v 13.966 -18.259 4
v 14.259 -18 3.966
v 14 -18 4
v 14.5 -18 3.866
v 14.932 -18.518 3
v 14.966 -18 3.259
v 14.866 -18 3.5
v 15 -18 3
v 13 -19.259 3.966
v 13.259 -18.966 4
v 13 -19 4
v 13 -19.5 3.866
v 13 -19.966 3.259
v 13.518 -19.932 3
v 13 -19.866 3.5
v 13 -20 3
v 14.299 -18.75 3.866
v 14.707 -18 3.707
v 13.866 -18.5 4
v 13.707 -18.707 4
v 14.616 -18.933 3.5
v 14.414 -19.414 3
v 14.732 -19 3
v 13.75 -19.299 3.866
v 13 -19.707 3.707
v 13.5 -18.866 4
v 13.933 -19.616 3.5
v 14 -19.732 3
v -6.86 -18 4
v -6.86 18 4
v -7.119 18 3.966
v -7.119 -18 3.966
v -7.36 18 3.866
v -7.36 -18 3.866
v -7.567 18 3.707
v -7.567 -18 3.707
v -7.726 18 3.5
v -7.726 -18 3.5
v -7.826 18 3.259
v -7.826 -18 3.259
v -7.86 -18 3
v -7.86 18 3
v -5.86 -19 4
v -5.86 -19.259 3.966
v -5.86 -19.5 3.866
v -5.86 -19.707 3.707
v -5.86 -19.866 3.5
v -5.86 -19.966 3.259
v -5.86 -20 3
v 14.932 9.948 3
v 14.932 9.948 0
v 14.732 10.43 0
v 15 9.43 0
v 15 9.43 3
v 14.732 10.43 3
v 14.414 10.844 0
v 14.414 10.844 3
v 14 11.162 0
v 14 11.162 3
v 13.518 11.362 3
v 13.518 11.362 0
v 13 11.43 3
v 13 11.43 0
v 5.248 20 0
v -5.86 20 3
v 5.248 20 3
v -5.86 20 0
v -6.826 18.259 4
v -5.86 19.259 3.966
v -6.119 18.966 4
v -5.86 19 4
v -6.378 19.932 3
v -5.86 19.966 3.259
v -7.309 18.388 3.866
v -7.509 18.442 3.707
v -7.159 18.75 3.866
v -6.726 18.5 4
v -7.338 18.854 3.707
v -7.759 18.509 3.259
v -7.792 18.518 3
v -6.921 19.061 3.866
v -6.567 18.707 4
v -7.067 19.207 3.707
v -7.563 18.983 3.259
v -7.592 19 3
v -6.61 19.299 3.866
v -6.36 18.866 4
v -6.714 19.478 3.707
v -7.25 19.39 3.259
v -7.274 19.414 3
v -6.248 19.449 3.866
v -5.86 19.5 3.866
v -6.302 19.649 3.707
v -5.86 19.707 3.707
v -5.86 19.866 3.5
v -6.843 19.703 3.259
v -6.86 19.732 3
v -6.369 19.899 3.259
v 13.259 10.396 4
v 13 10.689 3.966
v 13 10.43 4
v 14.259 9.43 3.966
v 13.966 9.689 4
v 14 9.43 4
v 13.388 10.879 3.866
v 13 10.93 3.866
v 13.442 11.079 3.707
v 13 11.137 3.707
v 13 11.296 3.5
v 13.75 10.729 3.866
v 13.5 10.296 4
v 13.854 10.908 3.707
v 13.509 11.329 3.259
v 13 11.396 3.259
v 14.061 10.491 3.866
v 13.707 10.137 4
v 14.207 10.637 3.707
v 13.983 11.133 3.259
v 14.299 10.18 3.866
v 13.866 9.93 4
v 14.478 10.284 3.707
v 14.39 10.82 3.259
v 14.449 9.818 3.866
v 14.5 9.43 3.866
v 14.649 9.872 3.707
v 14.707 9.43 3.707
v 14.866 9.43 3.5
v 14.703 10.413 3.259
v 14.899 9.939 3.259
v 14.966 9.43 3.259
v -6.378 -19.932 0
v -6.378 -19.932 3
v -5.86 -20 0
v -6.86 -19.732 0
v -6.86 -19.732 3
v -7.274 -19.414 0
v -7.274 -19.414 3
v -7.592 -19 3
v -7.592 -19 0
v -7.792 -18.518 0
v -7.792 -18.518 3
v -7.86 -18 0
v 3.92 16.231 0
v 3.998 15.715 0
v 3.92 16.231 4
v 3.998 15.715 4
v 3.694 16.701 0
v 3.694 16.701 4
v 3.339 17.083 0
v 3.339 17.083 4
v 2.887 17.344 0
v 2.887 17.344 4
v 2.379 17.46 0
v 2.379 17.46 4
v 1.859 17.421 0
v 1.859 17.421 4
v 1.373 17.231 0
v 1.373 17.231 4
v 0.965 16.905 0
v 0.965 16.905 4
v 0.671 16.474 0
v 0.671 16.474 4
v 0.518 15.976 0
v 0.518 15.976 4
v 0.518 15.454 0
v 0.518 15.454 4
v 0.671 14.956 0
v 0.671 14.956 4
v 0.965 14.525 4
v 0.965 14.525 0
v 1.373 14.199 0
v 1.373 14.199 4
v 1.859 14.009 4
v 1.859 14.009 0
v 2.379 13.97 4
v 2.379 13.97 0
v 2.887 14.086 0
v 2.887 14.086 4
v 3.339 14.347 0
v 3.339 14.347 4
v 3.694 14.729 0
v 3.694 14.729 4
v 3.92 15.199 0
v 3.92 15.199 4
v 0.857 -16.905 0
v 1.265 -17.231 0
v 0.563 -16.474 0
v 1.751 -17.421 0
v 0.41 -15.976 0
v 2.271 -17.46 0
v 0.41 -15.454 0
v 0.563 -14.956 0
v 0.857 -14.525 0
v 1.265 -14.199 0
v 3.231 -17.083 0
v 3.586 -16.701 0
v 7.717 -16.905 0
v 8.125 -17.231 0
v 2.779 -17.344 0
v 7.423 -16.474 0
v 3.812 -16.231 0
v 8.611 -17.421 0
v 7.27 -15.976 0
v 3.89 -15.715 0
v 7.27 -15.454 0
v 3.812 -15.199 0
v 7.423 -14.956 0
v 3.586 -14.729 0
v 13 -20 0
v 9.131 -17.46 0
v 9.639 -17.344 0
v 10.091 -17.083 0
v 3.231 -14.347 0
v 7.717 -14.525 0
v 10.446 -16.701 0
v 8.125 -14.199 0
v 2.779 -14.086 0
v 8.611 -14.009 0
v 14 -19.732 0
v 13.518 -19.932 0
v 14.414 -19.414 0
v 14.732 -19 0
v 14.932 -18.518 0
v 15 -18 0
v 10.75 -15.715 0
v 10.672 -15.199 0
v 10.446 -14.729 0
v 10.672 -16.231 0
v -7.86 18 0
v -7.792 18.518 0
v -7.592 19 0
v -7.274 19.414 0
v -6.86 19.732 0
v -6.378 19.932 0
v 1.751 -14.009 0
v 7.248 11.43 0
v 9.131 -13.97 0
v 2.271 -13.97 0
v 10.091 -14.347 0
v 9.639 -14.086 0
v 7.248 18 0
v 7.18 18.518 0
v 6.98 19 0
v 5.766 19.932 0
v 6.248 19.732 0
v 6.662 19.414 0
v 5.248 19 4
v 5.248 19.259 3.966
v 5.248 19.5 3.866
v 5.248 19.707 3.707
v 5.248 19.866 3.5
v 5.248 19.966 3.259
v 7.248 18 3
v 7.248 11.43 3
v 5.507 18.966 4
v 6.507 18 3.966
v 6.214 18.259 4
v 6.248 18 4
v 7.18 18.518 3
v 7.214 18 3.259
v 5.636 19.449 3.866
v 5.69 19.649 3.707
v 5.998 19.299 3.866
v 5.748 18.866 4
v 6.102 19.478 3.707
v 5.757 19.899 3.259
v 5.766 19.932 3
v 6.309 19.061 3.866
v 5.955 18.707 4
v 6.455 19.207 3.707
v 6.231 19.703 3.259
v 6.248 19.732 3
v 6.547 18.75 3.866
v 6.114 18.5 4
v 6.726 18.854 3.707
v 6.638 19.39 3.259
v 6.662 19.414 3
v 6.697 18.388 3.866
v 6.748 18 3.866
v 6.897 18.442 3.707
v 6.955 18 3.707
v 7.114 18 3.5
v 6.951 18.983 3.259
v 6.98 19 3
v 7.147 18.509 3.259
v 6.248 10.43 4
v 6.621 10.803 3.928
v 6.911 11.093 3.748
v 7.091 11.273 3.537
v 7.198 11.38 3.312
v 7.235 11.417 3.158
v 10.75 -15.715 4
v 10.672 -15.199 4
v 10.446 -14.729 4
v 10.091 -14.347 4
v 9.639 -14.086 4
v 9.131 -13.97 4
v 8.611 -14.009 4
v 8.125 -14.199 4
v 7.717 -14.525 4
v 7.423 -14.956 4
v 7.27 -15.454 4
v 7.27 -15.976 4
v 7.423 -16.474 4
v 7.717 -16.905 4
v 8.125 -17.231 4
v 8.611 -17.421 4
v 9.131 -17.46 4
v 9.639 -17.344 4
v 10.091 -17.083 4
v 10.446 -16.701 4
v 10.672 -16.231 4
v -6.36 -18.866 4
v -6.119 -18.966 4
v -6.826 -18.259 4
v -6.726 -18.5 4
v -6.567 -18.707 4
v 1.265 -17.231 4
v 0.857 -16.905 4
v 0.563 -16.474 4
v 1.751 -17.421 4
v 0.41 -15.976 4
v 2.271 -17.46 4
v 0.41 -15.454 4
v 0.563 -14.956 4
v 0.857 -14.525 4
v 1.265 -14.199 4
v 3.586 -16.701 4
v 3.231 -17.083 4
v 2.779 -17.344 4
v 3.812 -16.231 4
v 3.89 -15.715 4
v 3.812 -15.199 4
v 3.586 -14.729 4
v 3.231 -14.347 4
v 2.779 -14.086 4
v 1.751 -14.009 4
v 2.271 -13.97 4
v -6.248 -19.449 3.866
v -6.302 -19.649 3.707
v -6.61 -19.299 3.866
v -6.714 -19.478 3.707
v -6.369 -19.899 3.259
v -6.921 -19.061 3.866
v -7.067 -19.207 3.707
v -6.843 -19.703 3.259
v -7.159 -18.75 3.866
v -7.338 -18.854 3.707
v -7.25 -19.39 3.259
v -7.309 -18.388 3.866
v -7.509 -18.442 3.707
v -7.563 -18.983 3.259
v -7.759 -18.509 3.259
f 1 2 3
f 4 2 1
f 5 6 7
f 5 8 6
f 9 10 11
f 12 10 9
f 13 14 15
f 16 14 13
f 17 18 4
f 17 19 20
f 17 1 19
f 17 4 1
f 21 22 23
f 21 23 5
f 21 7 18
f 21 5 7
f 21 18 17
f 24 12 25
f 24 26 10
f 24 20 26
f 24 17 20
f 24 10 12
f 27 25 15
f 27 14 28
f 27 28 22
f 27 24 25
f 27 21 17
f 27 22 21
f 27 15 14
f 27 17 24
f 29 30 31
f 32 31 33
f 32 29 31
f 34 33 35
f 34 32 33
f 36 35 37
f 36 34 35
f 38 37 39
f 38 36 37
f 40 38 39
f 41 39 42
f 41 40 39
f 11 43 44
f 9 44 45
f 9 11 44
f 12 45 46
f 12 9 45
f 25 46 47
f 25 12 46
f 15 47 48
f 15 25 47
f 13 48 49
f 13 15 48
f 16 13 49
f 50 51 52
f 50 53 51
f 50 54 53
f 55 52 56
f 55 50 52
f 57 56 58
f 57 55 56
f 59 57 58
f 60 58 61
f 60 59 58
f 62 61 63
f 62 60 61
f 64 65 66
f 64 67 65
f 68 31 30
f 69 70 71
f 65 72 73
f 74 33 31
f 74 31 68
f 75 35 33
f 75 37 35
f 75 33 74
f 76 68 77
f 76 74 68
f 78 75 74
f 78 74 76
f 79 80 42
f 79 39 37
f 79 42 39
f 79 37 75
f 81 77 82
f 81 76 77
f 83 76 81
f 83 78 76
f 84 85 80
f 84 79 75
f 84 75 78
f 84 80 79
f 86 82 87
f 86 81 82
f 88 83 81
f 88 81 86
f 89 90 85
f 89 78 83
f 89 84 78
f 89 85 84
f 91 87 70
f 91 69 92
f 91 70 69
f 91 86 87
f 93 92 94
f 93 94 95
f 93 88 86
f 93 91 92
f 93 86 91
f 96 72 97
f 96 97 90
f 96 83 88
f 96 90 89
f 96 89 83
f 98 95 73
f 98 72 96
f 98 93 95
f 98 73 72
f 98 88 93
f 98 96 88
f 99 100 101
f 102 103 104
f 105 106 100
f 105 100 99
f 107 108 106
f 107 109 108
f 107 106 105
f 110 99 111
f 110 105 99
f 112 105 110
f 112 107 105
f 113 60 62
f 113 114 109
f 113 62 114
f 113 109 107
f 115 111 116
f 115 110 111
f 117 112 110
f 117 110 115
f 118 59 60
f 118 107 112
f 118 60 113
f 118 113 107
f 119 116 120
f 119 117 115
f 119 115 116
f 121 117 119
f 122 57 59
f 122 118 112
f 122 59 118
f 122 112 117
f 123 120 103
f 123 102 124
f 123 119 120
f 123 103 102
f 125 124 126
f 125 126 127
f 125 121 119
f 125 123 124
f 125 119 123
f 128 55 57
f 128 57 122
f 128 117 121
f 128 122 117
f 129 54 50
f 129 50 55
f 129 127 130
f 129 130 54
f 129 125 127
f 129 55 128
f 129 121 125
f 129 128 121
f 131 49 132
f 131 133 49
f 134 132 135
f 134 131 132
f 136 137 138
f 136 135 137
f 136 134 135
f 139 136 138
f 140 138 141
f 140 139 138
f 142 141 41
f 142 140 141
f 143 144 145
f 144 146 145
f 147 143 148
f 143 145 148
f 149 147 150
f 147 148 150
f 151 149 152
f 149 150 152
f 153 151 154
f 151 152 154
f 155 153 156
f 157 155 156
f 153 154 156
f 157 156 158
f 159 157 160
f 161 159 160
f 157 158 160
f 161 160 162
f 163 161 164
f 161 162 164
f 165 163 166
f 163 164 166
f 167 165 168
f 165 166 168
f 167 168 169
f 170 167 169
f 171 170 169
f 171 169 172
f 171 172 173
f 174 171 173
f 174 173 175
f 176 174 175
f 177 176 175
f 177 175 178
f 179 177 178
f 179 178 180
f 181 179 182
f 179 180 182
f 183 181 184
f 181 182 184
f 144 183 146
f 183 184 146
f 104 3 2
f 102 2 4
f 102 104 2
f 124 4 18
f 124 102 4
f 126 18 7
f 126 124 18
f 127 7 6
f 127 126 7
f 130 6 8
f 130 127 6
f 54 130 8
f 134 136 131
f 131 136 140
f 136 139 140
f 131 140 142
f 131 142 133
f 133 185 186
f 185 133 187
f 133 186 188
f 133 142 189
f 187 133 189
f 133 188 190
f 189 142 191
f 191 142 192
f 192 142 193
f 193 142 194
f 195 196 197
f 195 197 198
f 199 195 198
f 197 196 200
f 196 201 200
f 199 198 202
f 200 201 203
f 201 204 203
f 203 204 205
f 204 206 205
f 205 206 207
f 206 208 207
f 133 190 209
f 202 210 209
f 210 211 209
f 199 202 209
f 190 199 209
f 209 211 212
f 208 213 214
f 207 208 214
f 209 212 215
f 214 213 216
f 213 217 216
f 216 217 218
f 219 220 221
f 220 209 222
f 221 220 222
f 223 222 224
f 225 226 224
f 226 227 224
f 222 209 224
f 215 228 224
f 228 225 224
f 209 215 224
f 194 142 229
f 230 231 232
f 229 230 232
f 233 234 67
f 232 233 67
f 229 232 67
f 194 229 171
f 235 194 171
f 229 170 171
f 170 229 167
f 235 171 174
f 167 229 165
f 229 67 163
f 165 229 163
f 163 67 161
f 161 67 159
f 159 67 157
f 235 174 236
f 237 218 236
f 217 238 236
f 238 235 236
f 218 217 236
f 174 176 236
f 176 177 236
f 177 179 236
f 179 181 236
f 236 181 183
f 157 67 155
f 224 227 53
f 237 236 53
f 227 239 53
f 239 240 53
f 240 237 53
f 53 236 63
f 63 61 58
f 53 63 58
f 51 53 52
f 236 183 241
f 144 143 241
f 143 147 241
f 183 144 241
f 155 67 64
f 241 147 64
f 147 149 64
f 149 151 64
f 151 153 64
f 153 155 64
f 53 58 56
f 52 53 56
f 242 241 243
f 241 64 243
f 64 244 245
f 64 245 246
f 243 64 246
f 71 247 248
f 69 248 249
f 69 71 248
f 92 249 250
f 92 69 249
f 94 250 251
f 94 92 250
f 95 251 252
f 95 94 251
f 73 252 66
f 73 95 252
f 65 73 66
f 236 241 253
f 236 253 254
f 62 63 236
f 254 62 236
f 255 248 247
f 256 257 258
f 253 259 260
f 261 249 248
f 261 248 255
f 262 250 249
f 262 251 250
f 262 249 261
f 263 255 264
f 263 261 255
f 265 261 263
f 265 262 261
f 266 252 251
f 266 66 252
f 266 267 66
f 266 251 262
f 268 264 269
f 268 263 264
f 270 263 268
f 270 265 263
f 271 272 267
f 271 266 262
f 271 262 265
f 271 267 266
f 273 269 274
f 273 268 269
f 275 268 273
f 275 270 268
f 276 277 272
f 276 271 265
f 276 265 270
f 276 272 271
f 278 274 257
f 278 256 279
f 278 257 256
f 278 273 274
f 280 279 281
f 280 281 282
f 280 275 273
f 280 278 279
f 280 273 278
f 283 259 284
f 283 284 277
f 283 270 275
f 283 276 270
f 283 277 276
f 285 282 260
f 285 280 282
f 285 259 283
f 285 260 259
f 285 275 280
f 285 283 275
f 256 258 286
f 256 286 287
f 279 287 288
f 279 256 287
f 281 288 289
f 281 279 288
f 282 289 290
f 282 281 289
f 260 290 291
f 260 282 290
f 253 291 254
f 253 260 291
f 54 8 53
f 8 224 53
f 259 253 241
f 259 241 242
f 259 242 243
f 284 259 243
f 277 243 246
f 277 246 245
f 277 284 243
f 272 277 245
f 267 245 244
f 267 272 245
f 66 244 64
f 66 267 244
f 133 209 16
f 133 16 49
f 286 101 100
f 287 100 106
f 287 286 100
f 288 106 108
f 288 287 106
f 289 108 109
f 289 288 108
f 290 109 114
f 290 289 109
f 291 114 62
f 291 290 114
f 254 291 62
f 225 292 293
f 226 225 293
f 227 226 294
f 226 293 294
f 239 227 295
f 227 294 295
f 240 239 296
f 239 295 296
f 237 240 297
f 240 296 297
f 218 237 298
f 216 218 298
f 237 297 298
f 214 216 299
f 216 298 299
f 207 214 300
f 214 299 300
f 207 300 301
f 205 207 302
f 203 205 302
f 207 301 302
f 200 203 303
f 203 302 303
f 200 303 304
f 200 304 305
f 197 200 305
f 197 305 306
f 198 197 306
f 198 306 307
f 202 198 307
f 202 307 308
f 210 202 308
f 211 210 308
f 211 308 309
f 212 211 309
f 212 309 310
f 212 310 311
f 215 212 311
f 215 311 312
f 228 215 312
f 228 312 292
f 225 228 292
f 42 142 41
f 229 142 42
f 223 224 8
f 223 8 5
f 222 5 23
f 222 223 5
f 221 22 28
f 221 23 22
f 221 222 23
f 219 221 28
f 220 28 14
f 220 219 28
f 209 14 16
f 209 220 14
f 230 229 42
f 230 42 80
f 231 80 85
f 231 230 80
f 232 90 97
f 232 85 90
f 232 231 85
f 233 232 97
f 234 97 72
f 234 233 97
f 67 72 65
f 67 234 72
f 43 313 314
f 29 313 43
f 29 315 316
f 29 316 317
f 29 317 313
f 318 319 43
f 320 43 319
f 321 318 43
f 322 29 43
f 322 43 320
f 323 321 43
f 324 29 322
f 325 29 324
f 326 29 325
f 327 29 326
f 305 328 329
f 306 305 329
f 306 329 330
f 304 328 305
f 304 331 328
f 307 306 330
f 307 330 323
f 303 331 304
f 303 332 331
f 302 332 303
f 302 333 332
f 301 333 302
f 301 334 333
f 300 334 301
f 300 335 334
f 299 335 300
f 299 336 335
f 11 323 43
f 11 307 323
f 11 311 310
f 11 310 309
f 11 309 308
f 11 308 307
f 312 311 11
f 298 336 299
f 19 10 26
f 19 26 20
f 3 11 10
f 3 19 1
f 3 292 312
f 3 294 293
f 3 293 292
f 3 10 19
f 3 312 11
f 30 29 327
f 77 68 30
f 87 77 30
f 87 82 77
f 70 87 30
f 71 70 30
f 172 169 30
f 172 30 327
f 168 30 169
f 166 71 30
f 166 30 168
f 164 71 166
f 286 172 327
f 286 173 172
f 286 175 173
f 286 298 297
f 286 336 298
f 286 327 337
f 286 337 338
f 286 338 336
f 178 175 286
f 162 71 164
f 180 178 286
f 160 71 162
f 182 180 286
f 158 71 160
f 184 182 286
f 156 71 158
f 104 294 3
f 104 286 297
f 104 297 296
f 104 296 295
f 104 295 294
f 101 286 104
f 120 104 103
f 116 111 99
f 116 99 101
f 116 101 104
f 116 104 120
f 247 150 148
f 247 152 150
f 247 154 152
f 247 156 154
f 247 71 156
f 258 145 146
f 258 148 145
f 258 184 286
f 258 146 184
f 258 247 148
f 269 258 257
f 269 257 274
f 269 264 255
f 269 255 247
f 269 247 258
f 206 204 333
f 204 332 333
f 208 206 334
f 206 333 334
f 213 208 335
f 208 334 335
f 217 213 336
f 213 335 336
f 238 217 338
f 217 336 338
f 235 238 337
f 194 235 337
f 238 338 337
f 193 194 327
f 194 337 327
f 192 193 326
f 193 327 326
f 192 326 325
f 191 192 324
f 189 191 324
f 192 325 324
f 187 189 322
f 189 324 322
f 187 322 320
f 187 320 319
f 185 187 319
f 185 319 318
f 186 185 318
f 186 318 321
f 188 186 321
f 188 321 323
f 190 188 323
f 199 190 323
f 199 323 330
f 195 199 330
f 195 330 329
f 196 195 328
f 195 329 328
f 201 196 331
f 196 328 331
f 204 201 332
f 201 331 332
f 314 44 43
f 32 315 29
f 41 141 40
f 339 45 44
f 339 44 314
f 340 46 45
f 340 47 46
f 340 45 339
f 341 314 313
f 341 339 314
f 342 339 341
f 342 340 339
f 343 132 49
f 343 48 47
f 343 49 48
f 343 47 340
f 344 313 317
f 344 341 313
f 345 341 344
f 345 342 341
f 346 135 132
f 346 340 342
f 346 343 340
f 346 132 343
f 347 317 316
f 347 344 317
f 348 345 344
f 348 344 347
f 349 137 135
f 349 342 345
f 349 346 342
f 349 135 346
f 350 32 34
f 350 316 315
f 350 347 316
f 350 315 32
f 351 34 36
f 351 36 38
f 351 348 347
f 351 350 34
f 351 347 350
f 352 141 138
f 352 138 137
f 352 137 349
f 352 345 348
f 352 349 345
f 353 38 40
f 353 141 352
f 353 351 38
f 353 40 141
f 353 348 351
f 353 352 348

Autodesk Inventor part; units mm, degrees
ref_plane "YZ Plane" through (0, 0, 0) normal (1, 0, 0) x (0, 1, 0)
ref_plane "XZ Plane" through (0, 0, 0) normal (0, 1, 0) x (-1, 0, 0)
ref_plane "Work Plane1" through (-7.86, -16.002, 12.7) normal (0, 0, 1) x (1, 0, 0)
sketch "Sketch5" plane through (0, 0, 0) normal (0, 0, 1) x (1, 0, 0)
  line L0 (7.248, 20) -> (7.248, 11.68) projected
  line L1 (-5.86, 20) -> (7.248, 20) projected
  arc A0 (-5.86, 20) -> (-7.86, 18) centre (-5.86, 18) ccw projected
  line L2 (-7.86, 11.68) -> (-7.86, 18) projected
  line L3 (-3.792, 11.68) -> (-7.86, 11.68) projected
  line L4 (-3.792, 16.252) -> (-3.792, 11.68) projected
  line L5 (-0.752, 16.252) -> (-3.792, 16.252) projected
  line L6 (-0.752, 11.68) -> (-0.752, 16.252) projected
  line L7 (7.248, 11.68) -> (-0.752, 11.68) projected
  arc A1 (-7.86, -18) -> (-5.86, -20) centre (-5.86, -18) ccw projected
  line L8 (13, -20) -> (-5.86, -20) projected
  arc A2 (13, -20) -> (15, -18) centre (13, -18) ccw projected
  line L9 (15, -11.68) -> (15, -18) projected
  line L10 (-0.752, -11.68) -> (15, -11.68) projected
  line L11 (-0.752, -16.252) -> (-0.752, -11.68) projected
  line L12 (-3.792, -16.252) -> (-0.752, -16.252) projected
  line L13 (-3.792, -11.68) -> (-3.792, -16.252) projected
  line L14 (-7.86, -11.68) -> (-3.792, -11.68) projected
  line L15 (-7.86, -18) -> (-7.86, -11.68) projected
  line L16 (-0.752, 16.252) -> (-3.792, 16.252)
  line L17 (-3.792, 16.252) -> (-3.792, -16.252)
  line L18 (-3.792, -16.252) -> (-0.752, -16.252)
  line L19 (-0.752, -16.252) -> (-0.752, 16.252)
  line L20 (7.248, 11.68) -> (-7.86, 11.68)
  line L21 (-7.86, 11.68) -> (-7.86, -11.68)
  line L22 (-7.86, -11.68) -> (7.248, -11.68)
  line L23 (7.248, -11.68) -> (7.248, 11.68)
  line L24 (15, 11.43) -> (-1.002, 11.43) projected
  line L25 (15, 11.43) -> (7.248, 11.43)
  line L26 (7.248, 11.43) -> (7.248, -11.68)
  line L27 (7.248, -11.68) -> (15, -11.68)
  line L28 (15, -11.68) -> (15, 11.43)
  point P0 (0, 0)
extrude "Extrusion3" add sketch "Sketch5" along normal blind 4
sketch "Sketch6" plane through (0, 0, 4) normal (0, 0, 1) x (1, 0, 0)
  line L0 (7.248, 11.43) -> (7.248, 20) projected
  line L1 (7.248, 15.715) -> (2.248, 15.715)
  circle A0 centre (2.248, 15.715) radius 1.75
  line L2 (14.9228, 0) -> (0, 0)
  line L3 (7.248, 20) -> (7.248, 15.715)
  line L4 (15, -18) -> (15, 11.43) projected
  line L5 (15, -20) -> (15, -15.715)
  line L6 (15, -15.715) -> (-7.86, -15.715)
  line L7 (-7.86, 18) -> (-7.86, -18) projected
  line L8 (15, -15.715) -> (9, -15.715)
  circle A1 centre (9, -15.715) radius 1.75
  line L9 (-7.86, -15.715) -> (2.14, -15.715)
  circle A2 centre (2.14, -15.715) radius 1.75
  dimension "d14" = 5
  dimension "d15" = 3.5
  dimension "d16" = 4.285
  dimension "d17" = 6
  dimension "d18" = 3.5
  dimension "d19" = 10
  dimension "d20" = 3.5
extrude "Extrusion4" cut sketch "Sketch6" against normal blind 4
fillet "Fillet1" radius 2 2 edges at (7.248, 20, 2) (15, 11.43, 2)
fillet "Fillet2" radius 1 11 edges at (6.6622, 19.4142, 4) (-0.306, 20, 4) (-7.2742, 19.4142, 4) (-7.86, 0, 4) (-7.2742, -19.4142, 4) (3.57, -20, 4) (14.4142, -19.4142, 4) (15, -4.285, 4) (14.4142, 10.8442, 4) (10.124, 11.43, 4) (7.248, 14.715, 4)
properties part number "SyringeServoBaseClamp"
